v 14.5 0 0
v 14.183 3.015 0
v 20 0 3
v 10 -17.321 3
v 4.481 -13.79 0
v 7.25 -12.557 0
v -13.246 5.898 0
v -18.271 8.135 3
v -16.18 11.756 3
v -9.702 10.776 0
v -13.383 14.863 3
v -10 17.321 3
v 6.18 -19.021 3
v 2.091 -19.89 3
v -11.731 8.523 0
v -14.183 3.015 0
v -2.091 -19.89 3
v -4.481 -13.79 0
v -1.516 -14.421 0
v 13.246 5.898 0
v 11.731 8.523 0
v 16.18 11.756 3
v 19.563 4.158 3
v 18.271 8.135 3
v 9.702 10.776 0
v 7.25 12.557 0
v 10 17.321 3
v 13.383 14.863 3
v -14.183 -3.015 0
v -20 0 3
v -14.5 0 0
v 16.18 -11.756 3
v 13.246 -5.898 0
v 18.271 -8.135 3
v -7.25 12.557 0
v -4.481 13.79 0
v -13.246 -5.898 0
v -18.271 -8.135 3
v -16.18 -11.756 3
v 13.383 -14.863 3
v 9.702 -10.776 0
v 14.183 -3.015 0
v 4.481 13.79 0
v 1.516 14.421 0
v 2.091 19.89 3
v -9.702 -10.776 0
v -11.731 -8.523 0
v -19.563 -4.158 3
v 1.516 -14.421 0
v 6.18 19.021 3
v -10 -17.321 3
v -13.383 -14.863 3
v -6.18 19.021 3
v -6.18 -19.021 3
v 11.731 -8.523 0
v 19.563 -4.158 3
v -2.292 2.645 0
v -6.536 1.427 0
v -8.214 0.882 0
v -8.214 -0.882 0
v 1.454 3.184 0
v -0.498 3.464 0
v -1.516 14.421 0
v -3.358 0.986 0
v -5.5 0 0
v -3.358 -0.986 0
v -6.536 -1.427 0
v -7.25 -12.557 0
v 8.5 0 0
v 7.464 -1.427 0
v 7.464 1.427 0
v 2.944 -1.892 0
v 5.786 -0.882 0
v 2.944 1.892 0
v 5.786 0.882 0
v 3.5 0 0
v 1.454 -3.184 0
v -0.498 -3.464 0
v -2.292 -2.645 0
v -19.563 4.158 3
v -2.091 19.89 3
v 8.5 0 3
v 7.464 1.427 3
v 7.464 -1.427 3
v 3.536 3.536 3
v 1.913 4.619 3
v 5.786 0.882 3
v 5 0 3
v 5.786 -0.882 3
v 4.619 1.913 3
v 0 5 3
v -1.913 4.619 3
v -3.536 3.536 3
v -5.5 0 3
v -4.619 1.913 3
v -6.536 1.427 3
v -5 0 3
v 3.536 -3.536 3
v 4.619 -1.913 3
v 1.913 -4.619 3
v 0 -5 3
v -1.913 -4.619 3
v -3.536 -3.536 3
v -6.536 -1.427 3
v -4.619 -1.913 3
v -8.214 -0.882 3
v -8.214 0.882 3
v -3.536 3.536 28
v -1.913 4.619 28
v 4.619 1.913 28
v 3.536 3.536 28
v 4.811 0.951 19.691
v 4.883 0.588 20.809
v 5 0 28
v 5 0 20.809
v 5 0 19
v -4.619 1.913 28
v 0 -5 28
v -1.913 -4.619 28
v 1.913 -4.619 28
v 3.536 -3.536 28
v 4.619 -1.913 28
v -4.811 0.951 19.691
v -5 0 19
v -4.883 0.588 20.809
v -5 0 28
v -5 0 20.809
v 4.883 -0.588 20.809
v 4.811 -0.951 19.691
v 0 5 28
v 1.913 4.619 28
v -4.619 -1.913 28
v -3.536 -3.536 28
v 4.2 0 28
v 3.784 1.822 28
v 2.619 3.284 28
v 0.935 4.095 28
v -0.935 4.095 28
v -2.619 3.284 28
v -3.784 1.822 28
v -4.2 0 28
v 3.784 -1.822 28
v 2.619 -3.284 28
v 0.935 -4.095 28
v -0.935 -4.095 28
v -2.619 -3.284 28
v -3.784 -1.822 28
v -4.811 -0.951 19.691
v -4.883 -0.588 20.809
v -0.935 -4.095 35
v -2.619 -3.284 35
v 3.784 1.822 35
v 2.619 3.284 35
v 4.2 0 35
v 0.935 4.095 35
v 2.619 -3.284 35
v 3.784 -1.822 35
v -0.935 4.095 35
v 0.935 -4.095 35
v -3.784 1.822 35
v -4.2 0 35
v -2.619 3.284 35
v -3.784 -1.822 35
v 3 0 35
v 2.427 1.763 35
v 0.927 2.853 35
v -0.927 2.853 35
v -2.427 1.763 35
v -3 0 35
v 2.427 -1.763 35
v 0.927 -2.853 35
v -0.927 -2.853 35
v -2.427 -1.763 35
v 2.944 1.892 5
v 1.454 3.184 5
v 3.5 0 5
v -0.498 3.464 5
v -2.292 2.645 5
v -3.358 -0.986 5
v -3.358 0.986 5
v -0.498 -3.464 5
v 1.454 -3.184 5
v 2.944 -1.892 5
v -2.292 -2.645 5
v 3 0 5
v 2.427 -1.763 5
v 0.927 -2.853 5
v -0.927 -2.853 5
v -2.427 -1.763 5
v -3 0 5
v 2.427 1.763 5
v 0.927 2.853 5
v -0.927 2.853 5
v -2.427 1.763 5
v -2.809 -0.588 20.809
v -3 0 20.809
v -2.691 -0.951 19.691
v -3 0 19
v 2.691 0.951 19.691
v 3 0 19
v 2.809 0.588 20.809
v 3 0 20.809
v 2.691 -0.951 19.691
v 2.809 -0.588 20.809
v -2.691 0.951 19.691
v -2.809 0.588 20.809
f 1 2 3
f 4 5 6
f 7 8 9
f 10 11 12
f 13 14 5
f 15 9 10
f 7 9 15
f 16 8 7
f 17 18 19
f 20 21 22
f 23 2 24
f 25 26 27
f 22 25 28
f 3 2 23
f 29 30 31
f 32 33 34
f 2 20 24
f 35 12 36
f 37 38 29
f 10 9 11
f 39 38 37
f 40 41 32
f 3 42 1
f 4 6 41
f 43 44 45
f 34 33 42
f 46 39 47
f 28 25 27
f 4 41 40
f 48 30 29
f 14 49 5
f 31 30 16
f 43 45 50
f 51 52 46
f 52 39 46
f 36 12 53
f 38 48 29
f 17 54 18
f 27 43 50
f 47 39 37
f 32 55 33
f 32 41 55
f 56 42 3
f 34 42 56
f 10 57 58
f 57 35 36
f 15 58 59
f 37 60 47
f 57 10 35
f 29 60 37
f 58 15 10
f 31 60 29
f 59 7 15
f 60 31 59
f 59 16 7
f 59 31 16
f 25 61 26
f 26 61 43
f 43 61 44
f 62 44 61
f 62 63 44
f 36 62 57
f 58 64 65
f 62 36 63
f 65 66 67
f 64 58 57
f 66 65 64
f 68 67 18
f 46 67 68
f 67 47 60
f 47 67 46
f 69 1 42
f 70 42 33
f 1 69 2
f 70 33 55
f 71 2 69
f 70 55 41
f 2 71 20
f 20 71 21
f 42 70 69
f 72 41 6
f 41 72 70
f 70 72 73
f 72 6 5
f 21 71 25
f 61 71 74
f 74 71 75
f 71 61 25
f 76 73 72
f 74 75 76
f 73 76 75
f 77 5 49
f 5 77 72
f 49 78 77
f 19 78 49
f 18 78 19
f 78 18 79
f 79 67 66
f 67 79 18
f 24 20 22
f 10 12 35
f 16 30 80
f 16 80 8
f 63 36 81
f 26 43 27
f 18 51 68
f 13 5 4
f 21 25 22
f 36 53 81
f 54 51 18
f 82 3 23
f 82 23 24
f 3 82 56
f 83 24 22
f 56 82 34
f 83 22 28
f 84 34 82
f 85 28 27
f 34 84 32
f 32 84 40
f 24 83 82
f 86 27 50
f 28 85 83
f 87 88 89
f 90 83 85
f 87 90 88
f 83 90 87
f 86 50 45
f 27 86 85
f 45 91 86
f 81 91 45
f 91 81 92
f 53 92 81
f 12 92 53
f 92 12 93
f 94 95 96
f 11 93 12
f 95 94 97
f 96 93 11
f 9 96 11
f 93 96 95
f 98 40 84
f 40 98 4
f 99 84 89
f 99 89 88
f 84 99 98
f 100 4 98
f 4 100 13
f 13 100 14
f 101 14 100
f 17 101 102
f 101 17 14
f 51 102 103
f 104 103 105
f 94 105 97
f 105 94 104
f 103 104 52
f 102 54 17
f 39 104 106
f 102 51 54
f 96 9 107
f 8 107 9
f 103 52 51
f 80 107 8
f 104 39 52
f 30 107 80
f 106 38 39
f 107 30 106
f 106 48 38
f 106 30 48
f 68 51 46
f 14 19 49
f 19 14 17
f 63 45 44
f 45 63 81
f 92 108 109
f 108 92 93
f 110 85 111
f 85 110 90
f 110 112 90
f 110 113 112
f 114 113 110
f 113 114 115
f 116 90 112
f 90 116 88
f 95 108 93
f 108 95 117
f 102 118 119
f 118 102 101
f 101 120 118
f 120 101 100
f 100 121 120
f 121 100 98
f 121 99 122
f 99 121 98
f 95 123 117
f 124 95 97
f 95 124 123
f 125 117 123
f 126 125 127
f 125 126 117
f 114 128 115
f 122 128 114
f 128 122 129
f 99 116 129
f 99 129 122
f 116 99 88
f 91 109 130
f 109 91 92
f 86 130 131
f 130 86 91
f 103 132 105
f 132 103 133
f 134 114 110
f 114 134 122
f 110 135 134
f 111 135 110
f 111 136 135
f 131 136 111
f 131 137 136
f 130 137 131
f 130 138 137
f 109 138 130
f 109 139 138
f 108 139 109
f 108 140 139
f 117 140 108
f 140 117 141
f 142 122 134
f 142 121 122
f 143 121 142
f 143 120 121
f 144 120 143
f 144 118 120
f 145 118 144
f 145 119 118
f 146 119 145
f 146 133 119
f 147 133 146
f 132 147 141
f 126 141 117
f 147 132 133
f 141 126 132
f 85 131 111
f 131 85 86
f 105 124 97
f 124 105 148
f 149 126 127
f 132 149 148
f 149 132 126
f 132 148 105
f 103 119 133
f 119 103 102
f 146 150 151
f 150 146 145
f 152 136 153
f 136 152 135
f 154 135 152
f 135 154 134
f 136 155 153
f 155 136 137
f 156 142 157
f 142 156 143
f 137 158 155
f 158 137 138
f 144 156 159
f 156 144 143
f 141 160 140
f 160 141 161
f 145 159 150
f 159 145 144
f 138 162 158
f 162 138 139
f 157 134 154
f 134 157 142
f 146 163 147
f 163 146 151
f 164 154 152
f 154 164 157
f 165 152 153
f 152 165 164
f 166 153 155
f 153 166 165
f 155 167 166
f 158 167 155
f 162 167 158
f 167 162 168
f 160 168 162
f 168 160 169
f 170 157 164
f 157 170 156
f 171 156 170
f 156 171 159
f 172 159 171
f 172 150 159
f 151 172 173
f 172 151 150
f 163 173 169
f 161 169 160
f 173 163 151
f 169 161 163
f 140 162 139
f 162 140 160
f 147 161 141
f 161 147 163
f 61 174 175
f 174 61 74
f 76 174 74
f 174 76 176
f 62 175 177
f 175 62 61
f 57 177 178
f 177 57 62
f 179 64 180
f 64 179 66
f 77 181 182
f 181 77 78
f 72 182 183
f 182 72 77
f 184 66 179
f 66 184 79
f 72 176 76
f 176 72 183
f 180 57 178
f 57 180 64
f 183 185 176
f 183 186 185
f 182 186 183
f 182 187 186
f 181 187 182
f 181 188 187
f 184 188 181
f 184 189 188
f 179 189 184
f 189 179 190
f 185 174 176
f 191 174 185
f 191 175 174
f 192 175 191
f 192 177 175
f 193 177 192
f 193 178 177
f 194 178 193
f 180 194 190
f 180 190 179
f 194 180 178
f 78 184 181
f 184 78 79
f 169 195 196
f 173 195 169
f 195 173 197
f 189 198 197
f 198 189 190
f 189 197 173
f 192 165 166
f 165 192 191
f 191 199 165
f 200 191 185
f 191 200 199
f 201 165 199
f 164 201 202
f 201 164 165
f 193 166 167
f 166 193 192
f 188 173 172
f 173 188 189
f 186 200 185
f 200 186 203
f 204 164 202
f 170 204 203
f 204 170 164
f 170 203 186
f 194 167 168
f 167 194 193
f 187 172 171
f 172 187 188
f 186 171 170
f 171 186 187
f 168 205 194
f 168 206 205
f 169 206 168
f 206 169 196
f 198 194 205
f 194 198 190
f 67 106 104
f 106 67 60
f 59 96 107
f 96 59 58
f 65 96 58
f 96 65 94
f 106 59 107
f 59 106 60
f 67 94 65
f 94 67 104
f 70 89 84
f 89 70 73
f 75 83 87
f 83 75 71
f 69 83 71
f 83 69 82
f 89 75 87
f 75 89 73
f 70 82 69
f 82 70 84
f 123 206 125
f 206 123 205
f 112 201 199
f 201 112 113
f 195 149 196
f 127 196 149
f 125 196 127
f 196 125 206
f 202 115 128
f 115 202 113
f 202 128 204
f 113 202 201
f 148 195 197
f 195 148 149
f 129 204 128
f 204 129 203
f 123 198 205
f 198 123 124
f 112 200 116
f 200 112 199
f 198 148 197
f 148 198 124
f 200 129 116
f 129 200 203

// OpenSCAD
module drawSpool() {
difference() {
    union() {
      cylinder(3,d1=29,d2=40);
      cylinder(28,d=10);
      cylinder(35,d=8.4);
      //translate([0,0,8]) cylinder(6,d1=10,d2=22);
       
    }
    cylinder(5, d=7);
    //cylinder(20, d=3.5);
    translate([0,0,0]) cylinder(45, d=6);
    translate([-7,0,0]) cylinder(9,d=3);
    translate([7,0,0]) cylinder(9,d=3);
    translate([-10,0,20]) rotate([0,90,0])cylinder(30, d=2);
}
}
drawSpool();
